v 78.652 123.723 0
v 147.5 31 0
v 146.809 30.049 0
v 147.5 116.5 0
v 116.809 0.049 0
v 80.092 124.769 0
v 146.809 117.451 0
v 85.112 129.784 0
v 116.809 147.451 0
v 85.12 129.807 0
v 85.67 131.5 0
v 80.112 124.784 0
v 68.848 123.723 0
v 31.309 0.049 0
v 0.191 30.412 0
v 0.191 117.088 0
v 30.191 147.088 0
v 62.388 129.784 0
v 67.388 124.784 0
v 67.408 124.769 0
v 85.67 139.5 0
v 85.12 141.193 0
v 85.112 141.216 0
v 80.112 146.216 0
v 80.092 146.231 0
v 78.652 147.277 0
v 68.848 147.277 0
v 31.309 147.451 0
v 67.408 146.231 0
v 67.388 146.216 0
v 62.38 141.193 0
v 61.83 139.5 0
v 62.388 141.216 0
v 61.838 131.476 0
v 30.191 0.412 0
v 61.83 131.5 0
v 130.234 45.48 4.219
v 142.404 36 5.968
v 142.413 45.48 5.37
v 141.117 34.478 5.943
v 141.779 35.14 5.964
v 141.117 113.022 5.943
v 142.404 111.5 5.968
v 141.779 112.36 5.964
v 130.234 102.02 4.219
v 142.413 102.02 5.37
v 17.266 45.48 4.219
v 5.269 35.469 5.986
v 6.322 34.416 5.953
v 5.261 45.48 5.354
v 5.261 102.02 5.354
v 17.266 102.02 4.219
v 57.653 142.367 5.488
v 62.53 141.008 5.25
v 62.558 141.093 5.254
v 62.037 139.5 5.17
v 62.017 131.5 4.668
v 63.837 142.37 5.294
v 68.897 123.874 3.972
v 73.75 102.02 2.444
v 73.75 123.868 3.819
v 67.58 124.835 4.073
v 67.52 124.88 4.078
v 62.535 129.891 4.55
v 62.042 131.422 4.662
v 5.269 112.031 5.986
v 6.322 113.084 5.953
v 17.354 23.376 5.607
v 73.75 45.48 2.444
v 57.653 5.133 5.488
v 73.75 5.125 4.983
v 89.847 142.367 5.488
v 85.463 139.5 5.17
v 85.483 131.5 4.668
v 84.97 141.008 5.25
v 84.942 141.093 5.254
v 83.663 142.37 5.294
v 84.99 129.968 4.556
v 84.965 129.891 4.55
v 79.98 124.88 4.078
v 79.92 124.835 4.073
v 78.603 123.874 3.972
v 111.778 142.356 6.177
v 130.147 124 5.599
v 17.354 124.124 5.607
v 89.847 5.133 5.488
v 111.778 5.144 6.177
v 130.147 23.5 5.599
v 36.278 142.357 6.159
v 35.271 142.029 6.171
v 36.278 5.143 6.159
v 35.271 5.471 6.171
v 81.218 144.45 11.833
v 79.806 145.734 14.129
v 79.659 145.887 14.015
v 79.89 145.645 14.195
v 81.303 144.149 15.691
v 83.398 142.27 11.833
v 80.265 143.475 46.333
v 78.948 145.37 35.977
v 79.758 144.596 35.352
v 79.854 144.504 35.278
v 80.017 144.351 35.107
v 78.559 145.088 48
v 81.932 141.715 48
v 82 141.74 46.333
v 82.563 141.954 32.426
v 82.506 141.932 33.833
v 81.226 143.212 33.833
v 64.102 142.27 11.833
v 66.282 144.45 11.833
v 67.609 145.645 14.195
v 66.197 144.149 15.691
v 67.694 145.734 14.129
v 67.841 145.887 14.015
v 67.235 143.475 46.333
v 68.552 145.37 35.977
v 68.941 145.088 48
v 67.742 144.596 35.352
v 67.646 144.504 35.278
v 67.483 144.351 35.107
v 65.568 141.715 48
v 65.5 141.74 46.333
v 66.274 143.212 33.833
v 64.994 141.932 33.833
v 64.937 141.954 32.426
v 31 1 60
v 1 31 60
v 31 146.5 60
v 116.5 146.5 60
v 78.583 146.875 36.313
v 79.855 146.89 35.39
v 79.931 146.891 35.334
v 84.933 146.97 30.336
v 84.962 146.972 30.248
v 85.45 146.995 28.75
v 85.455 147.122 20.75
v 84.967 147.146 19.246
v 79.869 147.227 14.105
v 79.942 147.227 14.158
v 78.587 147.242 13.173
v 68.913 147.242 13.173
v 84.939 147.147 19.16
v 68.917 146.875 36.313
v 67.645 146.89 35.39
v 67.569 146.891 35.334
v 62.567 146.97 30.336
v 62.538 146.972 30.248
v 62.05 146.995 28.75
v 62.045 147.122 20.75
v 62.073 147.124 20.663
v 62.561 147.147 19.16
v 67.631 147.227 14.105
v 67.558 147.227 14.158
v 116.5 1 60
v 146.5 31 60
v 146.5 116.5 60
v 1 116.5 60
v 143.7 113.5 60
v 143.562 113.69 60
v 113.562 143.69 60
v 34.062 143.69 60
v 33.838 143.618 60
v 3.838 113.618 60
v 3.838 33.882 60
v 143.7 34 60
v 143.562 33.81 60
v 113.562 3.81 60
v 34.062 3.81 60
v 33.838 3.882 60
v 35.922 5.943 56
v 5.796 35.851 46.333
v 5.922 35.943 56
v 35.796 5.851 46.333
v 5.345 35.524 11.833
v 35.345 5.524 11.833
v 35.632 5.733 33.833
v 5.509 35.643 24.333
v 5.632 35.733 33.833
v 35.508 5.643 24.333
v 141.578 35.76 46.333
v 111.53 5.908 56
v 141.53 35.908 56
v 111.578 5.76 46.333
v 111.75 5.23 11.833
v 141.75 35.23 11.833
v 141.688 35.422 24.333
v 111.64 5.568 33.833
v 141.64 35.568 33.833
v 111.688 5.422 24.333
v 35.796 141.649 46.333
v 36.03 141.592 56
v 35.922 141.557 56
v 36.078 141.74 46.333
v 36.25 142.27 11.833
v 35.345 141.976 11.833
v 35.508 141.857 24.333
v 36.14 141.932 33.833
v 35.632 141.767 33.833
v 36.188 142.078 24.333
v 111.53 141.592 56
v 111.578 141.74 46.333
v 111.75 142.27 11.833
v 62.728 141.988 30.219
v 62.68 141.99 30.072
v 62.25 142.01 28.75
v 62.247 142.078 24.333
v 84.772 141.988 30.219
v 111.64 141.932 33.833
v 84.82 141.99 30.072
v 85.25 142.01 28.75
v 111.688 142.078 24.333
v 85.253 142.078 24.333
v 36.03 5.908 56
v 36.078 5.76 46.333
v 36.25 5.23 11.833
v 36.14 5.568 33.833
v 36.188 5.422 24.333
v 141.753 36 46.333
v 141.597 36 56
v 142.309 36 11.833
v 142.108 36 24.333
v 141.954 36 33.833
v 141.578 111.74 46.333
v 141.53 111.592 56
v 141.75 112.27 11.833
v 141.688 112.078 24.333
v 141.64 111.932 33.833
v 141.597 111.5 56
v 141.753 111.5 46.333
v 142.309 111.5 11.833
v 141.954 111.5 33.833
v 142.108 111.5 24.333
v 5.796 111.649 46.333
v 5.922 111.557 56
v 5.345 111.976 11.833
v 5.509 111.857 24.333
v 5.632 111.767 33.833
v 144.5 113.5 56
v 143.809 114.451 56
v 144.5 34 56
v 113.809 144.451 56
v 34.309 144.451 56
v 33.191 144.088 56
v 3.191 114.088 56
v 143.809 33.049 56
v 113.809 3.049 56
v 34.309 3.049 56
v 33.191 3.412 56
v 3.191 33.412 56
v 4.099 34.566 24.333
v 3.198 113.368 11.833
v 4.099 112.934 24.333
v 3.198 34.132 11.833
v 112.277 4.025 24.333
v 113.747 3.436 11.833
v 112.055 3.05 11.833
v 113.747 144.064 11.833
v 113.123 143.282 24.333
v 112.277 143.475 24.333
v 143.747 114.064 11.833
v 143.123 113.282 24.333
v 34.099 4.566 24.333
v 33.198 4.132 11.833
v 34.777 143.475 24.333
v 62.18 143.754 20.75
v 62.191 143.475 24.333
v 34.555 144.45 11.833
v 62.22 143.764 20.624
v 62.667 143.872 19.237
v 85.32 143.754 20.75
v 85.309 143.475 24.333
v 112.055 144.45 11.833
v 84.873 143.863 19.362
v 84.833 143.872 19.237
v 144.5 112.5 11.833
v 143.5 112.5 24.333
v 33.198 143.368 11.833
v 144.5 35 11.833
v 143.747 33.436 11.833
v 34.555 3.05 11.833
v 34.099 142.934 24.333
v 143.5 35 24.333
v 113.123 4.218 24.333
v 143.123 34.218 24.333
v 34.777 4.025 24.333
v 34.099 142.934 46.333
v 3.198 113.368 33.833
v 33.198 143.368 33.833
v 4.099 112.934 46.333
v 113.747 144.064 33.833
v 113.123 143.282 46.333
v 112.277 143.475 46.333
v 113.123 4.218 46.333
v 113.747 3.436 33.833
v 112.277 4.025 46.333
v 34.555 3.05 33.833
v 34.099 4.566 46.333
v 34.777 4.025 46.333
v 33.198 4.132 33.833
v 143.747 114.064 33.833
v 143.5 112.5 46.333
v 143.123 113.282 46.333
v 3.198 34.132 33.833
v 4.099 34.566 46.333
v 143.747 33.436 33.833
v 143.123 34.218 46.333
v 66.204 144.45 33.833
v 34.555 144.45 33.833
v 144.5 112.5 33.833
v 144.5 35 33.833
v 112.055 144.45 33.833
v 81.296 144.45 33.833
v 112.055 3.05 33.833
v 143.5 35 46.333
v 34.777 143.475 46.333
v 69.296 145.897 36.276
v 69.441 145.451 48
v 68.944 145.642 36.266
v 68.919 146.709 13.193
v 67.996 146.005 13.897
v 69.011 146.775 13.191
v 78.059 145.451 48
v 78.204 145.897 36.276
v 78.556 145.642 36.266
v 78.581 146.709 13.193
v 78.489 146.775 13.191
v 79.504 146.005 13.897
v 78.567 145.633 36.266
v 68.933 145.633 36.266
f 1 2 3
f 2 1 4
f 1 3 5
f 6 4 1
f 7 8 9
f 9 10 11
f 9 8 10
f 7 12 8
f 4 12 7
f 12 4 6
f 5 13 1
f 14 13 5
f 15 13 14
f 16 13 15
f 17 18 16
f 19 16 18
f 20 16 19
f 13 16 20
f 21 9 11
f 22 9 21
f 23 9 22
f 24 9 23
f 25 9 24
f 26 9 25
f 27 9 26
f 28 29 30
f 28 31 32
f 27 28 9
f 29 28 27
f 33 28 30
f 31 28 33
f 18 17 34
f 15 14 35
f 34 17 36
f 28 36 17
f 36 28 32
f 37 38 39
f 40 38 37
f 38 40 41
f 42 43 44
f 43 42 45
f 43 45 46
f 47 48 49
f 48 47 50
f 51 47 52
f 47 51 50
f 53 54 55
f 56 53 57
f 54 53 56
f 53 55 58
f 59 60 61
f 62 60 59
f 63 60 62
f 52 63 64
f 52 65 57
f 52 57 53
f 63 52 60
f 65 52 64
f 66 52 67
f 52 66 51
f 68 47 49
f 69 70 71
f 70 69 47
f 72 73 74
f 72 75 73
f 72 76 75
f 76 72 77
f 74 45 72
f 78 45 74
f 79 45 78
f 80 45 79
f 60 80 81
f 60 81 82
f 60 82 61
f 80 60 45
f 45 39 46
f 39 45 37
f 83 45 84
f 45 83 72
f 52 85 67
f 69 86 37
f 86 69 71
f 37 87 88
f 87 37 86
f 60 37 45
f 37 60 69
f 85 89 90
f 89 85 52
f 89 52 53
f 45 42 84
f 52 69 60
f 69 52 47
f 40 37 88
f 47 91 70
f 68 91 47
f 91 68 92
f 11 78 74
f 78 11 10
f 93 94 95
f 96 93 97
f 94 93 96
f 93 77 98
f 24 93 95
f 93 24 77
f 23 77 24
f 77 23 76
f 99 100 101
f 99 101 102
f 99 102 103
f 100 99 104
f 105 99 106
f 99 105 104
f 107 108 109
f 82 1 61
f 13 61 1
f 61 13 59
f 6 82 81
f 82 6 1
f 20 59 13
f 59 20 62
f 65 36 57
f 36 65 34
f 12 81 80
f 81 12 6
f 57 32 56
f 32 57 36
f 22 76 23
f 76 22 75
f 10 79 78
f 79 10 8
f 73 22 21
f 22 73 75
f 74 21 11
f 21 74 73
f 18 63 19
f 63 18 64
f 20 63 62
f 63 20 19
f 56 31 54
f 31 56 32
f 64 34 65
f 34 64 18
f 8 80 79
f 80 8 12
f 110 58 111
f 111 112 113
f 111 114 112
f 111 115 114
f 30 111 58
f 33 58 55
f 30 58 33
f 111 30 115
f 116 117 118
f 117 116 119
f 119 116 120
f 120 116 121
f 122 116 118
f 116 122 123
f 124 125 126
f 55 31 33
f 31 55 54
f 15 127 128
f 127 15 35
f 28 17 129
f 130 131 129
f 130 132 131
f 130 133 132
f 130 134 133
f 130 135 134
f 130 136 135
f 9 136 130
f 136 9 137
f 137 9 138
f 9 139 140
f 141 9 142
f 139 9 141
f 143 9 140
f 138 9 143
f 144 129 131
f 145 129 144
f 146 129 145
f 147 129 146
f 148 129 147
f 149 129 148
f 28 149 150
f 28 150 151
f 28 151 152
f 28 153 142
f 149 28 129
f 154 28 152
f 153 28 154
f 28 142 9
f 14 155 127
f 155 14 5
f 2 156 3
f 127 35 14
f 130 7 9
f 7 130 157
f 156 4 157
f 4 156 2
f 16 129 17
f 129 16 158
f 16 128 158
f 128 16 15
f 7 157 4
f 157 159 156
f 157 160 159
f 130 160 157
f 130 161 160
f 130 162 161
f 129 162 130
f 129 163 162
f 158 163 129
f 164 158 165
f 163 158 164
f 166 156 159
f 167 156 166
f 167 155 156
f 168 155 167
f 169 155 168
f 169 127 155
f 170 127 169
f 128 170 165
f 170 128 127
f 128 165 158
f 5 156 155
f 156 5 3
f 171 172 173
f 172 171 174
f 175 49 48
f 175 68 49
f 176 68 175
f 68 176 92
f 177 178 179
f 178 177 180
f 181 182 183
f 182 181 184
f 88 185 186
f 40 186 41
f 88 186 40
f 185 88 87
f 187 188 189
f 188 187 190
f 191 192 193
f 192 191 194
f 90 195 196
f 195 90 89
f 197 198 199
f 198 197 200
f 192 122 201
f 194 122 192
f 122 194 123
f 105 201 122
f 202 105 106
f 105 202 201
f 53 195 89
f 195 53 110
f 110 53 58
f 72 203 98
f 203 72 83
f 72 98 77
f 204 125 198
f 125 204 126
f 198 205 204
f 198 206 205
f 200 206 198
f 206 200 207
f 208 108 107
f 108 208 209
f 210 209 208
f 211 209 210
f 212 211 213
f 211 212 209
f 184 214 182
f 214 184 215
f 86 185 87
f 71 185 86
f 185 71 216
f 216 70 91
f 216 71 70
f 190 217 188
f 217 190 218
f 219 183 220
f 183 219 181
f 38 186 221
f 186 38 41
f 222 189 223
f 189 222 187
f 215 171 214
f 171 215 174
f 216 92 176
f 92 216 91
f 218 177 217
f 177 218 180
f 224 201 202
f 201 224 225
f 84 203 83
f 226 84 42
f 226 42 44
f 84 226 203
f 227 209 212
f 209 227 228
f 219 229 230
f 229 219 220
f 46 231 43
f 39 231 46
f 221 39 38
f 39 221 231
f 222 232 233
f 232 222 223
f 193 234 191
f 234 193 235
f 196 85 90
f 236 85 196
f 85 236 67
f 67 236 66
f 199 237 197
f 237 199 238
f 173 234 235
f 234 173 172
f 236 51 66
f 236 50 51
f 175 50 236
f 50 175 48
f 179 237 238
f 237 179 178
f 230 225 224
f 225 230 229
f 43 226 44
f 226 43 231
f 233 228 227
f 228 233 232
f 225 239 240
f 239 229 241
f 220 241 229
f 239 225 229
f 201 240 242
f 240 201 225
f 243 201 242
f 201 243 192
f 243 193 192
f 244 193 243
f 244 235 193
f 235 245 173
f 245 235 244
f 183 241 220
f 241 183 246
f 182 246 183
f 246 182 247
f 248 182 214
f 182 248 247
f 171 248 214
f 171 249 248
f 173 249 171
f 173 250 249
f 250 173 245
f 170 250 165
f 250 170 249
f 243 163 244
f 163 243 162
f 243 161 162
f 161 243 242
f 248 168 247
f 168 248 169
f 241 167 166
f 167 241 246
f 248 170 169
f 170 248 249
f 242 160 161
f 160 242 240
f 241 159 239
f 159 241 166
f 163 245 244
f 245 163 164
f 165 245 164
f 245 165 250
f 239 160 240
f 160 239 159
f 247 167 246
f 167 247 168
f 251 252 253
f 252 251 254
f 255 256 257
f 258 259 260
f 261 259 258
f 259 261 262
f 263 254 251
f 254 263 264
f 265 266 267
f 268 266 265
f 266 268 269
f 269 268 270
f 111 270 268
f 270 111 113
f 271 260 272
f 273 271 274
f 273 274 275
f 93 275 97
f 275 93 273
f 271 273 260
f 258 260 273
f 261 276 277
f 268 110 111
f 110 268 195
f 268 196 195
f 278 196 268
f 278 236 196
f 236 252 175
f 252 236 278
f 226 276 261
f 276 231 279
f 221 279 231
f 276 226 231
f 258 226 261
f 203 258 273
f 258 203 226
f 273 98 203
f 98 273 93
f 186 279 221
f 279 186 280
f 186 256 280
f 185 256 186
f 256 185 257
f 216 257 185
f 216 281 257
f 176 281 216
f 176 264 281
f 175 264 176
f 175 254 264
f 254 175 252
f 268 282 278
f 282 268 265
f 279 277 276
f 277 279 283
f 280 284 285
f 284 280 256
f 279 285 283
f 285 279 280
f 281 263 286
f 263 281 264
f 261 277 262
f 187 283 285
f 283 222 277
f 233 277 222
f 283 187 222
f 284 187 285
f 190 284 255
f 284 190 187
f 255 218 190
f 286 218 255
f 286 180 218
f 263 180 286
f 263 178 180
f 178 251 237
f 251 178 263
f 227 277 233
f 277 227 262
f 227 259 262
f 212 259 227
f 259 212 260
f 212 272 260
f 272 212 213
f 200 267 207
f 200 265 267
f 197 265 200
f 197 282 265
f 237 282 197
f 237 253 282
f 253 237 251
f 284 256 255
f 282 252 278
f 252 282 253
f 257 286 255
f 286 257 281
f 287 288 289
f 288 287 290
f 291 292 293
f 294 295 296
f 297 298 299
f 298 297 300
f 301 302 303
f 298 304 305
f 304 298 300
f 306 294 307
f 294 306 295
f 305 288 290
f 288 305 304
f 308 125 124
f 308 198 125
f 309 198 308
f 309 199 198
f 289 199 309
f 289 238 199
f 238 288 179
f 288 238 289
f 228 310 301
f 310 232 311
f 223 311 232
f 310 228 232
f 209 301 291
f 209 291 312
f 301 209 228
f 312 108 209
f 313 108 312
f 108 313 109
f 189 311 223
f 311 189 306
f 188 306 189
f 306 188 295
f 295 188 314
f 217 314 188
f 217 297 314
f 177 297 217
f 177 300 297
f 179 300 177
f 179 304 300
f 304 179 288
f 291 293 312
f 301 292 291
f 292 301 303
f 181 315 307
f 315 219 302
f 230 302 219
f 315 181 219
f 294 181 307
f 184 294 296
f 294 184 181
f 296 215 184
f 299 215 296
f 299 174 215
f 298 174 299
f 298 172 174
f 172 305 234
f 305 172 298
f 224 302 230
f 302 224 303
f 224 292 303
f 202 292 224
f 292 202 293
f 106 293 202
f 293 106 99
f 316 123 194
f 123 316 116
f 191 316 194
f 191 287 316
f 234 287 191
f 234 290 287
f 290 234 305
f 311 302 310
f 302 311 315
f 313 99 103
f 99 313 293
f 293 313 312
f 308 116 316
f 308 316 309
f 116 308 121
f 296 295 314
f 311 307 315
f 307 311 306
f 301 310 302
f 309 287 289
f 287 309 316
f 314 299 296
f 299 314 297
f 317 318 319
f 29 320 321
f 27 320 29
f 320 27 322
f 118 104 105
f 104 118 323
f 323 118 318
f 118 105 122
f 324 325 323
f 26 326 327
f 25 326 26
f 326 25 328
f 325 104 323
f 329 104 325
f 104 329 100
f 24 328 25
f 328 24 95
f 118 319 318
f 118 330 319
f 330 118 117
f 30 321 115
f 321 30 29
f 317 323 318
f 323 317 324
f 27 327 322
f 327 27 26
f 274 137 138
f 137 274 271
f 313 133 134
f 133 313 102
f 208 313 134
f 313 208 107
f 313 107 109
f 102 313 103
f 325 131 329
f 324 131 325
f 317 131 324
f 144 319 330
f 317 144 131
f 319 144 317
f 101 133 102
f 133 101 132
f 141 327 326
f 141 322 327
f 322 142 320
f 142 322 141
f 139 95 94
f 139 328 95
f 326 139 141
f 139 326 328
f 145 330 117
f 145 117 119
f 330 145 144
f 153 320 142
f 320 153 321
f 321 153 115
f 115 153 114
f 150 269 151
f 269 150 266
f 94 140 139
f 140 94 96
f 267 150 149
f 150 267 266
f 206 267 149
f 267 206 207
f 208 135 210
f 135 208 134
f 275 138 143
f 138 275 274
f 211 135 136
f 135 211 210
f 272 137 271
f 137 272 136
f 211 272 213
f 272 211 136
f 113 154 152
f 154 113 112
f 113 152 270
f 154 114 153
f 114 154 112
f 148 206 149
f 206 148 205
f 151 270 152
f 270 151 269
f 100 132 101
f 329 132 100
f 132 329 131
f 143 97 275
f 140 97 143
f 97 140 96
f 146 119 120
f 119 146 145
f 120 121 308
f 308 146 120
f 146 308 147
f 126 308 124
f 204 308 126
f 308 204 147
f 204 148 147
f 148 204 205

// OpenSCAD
height = 60; 
side_length_global = 87.5;
corner_offset_global = 30;
abs_width_x = corner_offset_global * 2 + side_length_global;
abs_width_y = corner_offset_global * 2 + side_length_global;

module create_box_outline(sidewall_offset=0, cut_corner_offset=0, vertical_mod = 0, height_mod = height, radius = 1, radius2 = 0, leds = false){
    
    if(radius2 == 0){
        radius2 = radius;
    }
    
    edge_inset = corner_offset_global + cut_corner_offset;
    side_length = side_length_global + sidewall_offset;
    side_offset = side_length + edge_inset;
    point1 = [edge_inset,0,0];
    point2 = [0,edge_inset,0];
    point3 = [side_offset,0,0];
    point4 = [side_offset + edge_inset, edge_inset,0];
    point5 = [side_offset + edge_inset, side_offset ,0];
    point6 = [side_offset,side_offset + edge_inset,0];
    point7 = [edge_inset,side_offset + edge_inset,0];
    point8 = [0,side_offset,0];
    points = [ point1, point2, point3, point4, point5, point6, point7, point8 ];
    translate([-(sidewall_offset + cut_corner_offset * 2)/2,-(sidewall_offset + cut_corner_offset * 2)/2,vertical_mod]) c3_outline(points,radius, radius2,height_mod);
    
    // Now we should echo the x max and y max lengths
    // We should also print the perimeter length
    // Calculating x_max and y_max
    //x_max = max([for (p = points) p[0]]);
    //y_max = max([for (p = points) p[1]]);

    // Calculating the perimeter and printing outline coordinates
    perimeter = 0;
    corner_lengths = 4 * sqrt(edge_inset * edge_inset + edge_inset * edge_inset);
    
    side_lengths = side_length * 4;
    
    full_length = corner_lengths + side_lengths;
    
    led_length = 7;
    max_num_leds = full_length / led_length;
    
    echo(str("Total box perimeter: ", full_length));
    if(leds){
        echo(str("Max number of LEDS: ", max_num_leds));
    }
    echo(points);
    
   
}

 
module c3_outline(points, radius, radius2, height ){
    

    hull(){
        translate([radius,radius,0]) translate(points[0]) cylinder(r1=radius,r2=radius2, h=height);
        translate([radius, radius,0]) translate(points[1]) cylinder(r1=radius,r2=radius2, h=height);
        translate([-radius, radius,0])translate(points[2]) cylinder(r1=radius,r2=radius2, h=height);
        translate([-radius, radius,0]) translate(points[3]) cylinder(r1=radius,r2=radius2, h=height);
        translate([-radius, -radius,0]) translate(points[4]) cylinder(r1=radius,r2=radius2, h=height);
        translate([-radius, -radius,0])translate(points[5]) cylinder(r1=radius,r2=radius2, h=height);
        translate([radius, -radius,0]) translate(points[6]) cylinder(r1=radius,r2=radius2, h=height);
        translate([radius, -radius,0]) translate(points[7]) cylinder(r1=radius,r2=radius2, h=height);
    }
}

module box_back(){
    difference(){
        color("white") create_box_outline(sidewall_offset = -4,cut_corner_offset=0, vertical_mod = 0, height_mod = 20, radius = .01, radius2 = .01);
        #translate([abs_width_x/2,abs_width_y/2,902]) rotate([0,90,90]) sphere(900, $fn=100);
        #translate([0,abs_width_y/2 -12,0]) rotate([0,0,0]) create_box_outline(sidewall_offset = -side_length_global -2,cut_corner_offset=-corner_offset_global/2 - 2, vertical_mod = -2, height_mod = height - 10, radius=3, radius2=1);
        #translate([0,abs_width_y + 5,-49]) rotate([90,0,0]) create_box_outline(sidewall_offset = -side_length_global -2,cut_corner_offset=-corner_offset_global/2 - 2, vertical_mod = -2, height_mod = height - 10, radius=3, radius2=1);
    }
}
front_plexi_inset = 4;

module full_box(){
    difference(){
        //make the box
        echo("Make the box: ")

        color("blue") create_box_outline(height_mod=height);
        
        // Make a big cutout in the middle of the box
        echo("Make a big cutout in the middle of the box: ")

        create_box_outline(sidewall_offset = -10,cut_corner_offset=0, vertical_mod = 0, height_mod = 2 + height);
        
        echo("Top Mirror:")
        // Make the top lip for the mirror
        create_box_outline(sidewall_offset = -6,cut_corner_offset=0, vertical_mod = height - front_plexi_inset, height_mod = 5);
        
        // Make the bottom lip for the mirror
        //create_box_outline(sidewall_offset = -6,cut_corner_offset=0, vertical_mod = 0, height_mod = 4);
        // Make the MIDDLE lip for the LEDs
        echo("Middle lips for LEDs:");
        middle_lip_height = 12.5;
        create_box_outline(sidewall_offset = -6,cut_corner_offset=0, vertical_mod = ((height) /3 - middle_lip_height/3 - 2)- front_plexi_inset/2, height_mod = middle_lip_height, radius=2, radius2=1, leds = true);
        create_box_outline(sidewall_offset = -6,cut_corner_offset=0, vertical_mod = ((height) /3*2 - middle_lip_height/3 - 2) , height_mod = middle_lip_height, radius=2, radius2=1, leds = true);

        #translate([0,abs_width_y/2 -12,0]) rotate([0,0,0]) create_box_outline(sidewall_offset = -side_length_global -2,cut_corner_offset=-corner_offset_global/2 - 2, vertical_mod = -2, height_mod = height - 10, radius=3, radius2=1);
        #translate([0,abs_width_y + 5,-49]) rotate([90,0,0]) create_box_outline(sidewall_offset = -side_length_global -2,cut_corner_offset=-corner_offset_global/2 - 2, vertical_mod = -2, height_mod = height - 10, radius=3, radius2=1);
        //create_box_outline(sidewall_offset = -4,cut_corner_offset=0, vertical_mod = 2, height_mod = 8, radius = 10, radius2 = 4);
        // Make a hole for the wiring on this prototype
        echo("Make a hole for the wiring on this prototype");
        
        //#translate([0,abs_width_y,-49]) rotate([90,0,0]) create_box_outline(sidewall_offset = -side_length_global -2,cut_corner_offset=-corner_offset_global/2 - 2, vertical_mod = -2, height_mod = height - 10, radius=3, radius2=1);
        //cube([10,10,85]);
    }
}
// Make the bottom lip for the mirror
echo("Make the bottom lip for the mirror")
box_back();
full_box();
echo("The size of the cube is");
echo(abs_width_x);
